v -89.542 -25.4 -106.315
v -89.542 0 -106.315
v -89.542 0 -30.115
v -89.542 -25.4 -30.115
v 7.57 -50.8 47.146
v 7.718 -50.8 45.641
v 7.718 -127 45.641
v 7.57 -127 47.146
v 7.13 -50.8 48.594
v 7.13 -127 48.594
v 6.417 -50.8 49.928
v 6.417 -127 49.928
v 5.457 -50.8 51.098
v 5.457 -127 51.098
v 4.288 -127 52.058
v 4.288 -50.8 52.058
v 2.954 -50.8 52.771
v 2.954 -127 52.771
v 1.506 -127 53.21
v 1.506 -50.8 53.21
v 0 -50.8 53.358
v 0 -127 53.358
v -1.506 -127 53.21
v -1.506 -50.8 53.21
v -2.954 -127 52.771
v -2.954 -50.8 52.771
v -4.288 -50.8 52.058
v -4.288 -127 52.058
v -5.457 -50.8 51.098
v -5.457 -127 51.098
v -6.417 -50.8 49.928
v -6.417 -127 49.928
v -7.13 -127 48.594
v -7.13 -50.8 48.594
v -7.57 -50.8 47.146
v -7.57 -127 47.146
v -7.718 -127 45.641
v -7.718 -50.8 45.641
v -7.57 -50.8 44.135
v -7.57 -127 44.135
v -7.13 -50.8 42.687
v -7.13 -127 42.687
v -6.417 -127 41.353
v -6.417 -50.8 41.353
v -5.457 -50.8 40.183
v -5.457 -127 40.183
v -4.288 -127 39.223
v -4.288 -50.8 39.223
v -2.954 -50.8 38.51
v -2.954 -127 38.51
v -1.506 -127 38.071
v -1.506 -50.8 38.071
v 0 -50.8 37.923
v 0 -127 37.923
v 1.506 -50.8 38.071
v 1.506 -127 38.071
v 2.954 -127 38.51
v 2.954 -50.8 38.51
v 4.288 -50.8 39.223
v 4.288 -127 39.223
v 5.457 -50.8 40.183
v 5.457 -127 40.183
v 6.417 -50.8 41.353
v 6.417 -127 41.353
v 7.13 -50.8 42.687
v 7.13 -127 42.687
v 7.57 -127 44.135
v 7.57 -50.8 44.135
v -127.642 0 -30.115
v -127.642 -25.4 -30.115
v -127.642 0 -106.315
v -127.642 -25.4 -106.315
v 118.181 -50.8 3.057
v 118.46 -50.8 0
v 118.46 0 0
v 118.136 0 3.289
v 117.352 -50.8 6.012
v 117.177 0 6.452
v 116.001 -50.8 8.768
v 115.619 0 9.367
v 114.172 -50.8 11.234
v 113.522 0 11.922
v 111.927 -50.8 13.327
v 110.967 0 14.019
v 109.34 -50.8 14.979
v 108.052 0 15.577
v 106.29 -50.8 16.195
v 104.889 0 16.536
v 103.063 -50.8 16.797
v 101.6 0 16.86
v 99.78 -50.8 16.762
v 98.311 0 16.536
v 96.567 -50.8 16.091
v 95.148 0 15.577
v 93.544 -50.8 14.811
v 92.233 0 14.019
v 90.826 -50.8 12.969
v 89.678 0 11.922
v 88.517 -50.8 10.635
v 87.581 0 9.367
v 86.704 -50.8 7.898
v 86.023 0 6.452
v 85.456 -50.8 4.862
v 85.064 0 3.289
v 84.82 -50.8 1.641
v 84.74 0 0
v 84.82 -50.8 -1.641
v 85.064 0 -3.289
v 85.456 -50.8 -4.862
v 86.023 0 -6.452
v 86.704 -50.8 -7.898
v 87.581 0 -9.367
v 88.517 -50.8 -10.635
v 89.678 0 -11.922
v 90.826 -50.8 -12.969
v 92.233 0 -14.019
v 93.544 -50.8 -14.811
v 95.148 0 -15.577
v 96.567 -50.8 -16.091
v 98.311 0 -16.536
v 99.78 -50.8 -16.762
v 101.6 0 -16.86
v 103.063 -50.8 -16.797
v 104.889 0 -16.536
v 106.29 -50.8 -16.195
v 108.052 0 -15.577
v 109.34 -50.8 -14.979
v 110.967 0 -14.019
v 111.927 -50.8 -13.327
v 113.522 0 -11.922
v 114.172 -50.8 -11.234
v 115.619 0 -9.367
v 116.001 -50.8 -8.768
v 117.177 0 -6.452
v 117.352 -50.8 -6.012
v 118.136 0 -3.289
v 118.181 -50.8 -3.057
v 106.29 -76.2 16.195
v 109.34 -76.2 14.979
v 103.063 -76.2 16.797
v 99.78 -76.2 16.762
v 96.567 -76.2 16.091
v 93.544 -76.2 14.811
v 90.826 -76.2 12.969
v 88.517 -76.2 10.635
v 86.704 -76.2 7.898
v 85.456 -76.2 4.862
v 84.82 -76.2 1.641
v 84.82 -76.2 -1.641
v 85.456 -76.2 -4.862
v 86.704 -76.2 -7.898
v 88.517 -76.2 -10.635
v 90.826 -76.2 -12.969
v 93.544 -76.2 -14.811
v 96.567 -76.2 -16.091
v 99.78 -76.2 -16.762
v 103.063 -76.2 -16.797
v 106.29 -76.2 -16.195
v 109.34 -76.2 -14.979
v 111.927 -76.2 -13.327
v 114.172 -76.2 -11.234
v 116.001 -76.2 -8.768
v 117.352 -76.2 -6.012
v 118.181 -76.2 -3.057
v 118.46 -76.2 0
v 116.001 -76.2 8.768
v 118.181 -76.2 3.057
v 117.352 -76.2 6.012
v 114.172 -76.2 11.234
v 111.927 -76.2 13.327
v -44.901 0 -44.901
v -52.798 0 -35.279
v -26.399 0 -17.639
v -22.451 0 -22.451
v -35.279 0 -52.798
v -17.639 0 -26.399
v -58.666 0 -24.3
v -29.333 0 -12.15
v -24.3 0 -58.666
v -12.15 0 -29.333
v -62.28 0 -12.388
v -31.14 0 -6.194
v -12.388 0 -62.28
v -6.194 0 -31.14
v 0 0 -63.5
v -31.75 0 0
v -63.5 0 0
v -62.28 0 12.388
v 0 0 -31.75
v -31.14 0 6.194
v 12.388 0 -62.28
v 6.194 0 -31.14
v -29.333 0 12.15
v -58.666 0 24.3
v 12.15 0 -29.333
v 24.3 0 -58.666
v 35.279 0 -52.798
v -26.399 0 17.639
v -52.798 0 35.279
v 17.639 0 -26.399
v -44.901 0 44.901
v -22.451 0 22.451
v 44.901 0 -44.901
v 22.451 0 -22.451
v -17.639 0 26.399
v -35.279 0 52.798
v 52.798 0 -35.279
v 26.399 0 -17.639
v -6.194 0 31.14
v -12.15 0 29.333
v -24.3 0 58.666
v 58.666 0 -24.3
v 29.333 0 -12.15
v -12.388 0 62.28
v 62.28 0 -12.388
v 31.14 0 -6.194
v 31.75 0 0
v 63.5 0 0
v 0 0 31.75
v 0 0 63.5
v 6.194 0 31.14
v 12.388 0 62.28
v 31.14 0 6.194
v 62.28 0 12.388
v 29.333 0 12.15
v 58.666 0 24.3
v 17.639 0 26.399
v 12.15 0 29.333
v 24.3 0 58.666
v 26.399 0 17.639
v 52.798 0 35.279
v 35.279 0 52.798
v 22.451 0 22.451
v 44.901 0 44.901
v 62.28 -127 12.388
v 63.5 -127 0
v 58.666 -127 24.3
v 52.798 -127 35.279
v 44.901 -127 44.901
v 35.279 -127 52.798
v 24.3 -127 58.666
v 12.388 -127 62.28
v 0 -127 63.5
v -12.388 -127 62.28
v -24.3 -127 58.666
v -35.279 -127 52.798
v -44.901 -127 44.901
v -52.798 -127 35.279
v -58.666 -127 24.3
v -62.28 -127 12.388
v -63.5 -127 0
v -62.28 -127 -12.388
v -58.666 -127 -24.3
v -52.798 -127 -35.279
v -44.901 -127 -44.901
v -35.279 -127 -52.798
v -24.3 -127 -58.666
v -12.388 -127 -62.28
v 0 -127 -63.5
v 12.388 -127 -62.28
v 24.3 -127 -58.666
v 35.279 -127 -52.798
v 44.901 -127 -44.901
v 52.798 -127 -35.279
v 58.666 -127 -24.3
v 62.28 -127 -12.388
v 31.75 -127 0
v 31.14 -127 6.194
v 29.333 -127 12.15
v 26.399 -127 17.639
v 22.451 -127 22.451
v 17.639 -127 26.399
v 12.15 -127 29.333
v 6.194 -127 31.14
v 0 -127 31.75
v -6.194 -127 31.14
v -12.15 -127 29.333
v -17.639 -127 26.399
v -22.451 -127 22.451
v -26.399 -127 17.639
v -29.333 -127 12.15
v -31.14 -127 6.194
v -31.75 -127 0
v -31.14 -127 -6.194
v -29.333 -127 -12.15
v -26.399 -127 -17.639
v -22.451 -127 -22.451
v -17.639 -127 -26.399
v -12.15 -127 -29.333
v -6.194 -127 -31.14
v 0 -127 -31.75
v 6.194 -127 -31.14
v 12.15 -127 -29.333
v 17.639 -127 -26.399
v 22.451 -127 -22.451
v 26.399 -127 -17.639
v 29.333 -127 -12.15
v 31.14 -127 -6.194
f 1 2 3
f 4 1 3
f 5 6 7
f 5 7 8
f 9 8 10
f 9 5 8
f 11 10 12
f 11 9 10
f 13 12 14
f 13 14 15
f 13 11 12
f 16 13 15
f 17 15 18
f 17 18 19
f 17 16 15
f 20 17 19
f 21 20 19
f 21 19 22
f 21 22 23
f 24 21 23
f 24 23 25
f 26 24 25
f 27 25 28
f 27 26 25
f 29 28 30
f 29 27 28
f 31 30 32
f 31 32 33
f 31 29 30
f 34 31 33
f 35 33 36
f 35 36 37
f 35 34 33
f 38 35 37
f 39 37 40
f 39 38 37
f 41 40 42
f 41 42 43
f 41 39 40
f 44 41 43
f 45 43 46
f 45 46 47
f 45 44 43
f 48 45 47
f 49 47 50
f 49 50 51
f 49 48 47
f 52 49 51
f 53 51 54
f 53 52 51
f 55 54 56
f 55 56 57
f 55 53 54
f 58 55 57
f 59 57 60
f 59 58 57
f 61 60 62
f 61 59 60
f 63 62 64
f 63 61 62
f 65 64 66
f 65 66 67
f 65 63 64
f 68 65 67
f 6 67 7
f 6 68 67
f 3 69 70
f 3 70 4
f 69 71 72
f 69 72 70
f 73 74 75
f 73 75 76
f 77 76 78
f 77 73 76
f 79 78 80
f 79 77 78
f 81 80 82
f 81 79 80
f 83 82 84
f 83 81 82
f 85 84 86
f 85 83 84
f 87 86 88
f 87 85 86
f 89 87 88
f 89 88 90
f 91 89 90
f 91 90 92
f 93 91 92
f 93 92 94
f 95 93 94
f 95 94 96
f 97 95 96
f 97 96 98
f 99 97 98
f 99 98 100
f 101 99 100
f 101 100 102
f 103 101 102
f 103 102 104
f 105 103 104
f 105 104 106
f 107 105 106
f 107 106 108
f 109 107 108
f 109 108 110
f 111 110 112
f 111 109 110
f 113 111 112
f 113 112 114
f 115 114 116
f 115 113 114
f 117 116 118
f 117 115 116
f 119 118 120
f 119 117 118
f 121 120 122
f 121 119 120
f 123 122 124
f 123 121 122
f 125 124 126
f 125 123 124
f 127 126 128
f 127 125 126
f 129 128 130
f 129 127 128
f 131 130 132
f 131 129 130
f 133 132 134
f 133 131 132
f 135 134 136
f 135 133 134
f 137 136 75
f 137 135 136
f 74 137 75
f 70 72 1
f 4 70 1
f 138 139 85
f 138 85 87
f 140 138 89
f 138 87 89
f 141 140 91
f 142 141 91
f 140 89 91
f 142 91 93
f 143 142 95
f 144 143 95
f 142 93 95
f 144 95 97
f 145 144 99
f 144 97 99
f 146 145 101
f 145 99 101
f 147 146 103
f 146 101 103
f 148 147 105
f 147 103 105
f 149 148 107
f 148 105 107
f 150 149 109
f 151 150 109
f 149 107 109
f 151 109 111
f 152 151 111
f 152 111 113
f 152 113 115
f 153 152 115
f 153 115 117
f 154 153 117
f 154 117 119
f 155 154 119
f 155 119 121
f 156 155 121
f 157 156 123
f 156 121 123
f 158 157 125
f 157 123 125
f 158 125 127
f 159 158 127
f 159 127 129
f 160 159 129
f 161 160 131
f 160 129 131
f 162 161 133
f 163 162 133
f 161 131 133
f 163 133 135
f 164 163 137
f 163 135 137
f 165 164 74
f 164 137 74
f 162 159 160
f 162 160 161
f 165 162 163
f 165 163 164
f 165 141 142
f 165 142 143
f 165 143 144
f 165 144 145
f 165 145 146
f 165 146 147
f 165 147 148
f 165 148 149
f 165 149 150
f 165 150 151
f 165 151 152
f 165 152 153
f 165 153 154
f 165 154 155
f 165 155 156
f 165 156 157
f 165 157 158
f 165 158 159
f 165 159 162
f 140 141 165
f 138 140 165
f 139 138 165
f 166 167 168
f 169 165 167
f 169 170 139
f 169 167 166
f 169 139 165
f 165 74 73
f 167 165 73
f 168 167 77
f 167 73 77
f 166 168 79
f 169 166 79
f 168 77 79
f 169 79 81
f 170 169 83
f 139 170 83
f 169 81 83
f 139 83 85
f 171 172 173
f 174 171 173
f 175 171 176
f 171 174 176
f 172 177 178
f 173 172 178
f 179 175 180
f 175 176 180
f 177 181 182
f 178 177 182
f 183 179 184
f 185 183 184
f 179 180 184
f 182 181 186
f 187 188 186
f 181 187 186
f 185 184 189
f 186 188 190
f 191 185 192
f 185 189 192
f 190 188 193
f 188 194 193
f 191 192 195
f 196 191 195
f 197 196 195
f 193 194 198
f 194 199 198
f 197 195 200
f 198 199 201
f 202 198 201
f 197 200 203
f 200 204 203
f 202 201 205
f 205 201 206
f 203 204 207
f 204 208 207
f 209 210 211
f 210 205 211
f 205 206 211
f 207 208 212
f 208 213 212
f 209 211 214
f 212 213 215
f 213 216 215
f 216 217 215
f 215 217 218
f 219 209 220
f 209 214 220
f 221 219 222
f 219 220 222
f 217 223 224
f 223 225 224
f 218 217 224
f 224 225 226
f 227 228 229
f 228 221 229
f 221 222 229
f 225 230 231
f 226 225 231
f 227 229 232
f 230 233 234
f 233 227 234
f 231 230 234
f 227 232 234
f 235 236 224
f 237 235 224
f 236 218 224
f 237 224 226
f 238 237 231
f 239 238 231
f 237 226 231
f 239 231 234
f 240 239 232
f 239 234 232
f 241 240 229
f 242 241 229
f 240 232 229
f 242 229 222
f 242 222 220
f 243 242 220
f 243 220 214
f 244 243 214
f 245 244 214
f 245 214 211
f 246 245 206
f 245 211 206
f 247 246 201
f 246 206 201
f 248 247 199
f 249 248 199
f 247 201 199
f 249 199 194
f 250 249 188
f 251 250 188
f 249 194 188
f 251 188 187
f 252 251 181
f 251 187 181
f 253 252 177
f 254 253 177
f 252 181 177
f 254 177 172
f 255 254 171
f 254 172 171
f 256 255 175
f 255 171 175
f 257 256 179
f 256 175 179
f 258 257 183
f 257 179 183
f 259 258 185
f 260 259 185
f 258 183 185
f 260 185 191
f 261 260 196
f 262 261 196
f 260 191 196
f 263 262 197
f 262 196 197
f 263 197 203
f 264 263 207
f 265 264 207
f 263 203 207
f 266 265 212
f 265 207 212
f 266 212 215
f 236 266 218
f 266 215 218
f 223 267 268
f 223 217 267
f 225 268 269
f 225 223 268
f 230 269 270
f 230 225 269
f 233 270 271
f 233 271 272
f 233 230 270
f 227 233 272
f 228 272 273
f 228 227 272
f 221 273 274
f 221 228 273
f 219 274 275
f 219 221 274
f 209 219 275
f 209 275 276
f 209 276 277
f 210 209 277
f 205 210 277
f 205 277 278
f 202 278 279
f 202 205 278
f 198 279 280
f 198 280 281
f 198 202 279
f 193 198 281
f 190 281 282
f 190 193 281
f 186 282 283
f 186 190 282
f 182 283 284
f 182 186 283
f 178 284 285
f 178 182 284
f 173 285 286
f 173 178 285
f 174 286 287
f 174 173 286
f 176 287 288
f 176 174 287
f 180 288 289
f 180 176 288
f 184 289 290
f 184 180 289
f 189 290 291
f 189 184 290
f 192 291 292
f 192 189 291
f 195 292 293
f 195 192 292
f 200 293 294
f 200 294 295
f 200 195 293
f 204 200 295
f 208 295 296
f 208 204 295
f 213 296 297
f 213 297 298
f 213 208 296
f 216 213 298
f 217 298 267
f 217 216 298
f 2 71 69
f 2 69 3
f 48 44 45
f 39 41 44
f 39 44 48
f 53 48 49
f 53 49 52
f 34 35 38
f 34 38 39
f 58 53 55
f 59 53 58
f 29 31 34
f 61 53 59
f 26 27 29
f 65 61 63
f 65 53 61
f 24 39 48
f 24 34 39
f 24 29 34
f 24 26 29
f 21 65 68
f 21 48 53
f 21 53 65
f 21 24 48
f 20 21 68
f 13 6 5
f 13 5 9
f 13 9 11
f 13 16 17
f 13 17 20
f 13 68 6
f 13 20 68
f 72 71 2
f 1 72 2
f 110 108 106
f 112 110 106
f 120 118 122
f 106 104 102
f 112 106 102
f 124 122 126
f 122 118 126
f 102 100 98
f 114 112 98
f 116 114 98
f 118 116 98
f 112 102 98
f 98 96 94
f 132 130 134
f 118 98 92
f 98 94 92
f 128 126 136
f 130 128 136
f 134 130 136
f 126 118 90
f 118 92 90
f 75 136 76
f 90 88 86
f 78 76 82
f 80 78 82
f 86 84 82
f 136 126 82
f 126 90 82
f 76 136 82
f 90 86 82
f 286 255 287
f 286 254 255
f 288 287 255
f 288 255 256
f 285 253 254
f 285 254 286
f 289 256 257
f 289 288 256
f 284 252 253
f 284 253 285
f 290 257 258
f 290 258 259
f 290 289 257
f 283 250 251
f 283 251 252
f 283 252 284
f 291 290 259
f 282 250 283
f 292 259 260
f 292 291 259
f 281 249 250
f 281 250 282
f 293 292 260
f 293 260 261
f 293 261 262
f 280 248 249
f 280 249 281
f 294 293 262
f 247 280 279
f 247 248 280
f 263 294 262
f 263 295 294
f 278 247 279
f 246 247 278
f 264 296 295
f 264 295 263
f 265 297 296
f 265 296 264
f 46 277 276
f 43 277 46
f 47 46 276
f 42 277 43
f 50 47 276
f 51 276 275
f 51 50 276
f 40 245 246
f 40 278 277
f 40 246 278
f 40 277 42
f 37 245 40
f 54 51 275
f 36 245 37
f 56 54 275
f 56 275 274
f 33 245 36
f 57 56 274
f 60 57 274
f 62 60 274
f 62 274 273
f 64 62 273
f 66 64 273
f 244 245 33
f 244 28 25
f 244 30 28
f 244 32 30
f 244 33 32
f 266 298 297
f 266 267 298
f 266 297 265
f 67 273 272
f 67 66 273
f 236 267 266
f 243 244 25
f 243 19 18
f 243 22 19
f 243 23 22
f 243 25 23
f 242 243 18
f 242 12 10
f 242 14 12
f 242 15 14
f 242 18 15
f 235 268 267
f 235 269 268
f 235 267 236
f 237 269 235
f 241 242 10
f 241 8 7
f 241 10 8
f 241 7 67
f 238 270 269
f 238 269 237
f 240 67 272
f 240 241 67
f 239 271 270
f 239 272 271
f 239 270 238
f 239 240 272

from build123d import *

# Parameters (mm, degrees)
F0_R      = 63.5
F0_R_2    = 31.75
F1_DEPTH  = 50.8
F2_R      = 7.717873
F3_DEPTH  = 50.8
F5_DEPTH  = 25.4
F5_FACE_R = 16.860184
F6_DEPTH  = 76.2
F7_DEPTH  = 25.4
F2_R_2    = 63.5
F2_R_3    = 31.75
F8_DEPTH  = 76.2
F9_W      = 38.1
F9_H      = 76.2
F10_DEPTH = 25.4


with BuildPart() as f1:
    # F0 (on Front) → F1 (new body)
    with BuildSketch(Plane.XZ):
        Circle(F0_R)
        Circle(F0_R_2, mode=Mode.SUBTRACT)
    extrude(amount=F1_DEPTH)

    # F2 (on face) → F3 (join)
    with BuildSketch(Plane.XZ.offset(50.8)):
        with Locations((0, 45.640536)):
            Circle(F2_R)
    extrude(amount=-F3_DEPTH)

    # F2 (on face) → F8 (join)
    with BuildSketch(Plane.XZ.offset(50.8)):
        Circle(F2_R_2)
        Circle(F2_R_3, mode=Mode.SUBTRACT)
        with Locations((0, 45.640536)):
            Circle(F2_R, mode=Mode.SUBTRACT)
    extrude(amount=F8_DEPTH)


with BuildPart() as f5:
    # F4 (on face) → F5 (new body)
    with BuildSketch(Plane.XZ.offset(50.8)):
        with BuildLine():
            ThreePointArc((109.339723, -14.978735), (116.000677, -8.768485), (118.460184, 0))
            ThreePointArc((118.460184, 0), (116.000677, 8.768485), (109.339723, 14.978735))
            ThreePointArc((109.339723, 14.978735), (84.739816, 0), (109.339723, -14.978735))
        make_face()
    extrude(amount=F5_DEPTH)

    # F5_face (on face) → F6 (join)
    with BuildSketch(Plane(origin=(101.6, -76.2, 0), x_dir=(1, 0, 0), z_dir=(0, -1, 0))):
        Circle(F5_FACE_R)
    extrude(amount=-F6_DEPTH)

    # F5_face (on face) → F7 (join)
    with BuildSketch(Plane(origin=(101.6, -76.2, 0), x_dir=(1, 0, 0), z_dir=(0, -1, 0))):
        Circle(F5_FACE_R)
    extrude(amount=-F7_DEPTH)


with BuildPart() as f10:
    # F9 (on Front) → F10 (new body)
    with BuildSketch(Plane.XZ):
        with Locations((-108.591778, -68.215)):
            Rectangle(F9_W, F9_H)
    extrude(amount=F10_DEPTH)


solid = Compound([f1.part, f5.part, f10.part])
